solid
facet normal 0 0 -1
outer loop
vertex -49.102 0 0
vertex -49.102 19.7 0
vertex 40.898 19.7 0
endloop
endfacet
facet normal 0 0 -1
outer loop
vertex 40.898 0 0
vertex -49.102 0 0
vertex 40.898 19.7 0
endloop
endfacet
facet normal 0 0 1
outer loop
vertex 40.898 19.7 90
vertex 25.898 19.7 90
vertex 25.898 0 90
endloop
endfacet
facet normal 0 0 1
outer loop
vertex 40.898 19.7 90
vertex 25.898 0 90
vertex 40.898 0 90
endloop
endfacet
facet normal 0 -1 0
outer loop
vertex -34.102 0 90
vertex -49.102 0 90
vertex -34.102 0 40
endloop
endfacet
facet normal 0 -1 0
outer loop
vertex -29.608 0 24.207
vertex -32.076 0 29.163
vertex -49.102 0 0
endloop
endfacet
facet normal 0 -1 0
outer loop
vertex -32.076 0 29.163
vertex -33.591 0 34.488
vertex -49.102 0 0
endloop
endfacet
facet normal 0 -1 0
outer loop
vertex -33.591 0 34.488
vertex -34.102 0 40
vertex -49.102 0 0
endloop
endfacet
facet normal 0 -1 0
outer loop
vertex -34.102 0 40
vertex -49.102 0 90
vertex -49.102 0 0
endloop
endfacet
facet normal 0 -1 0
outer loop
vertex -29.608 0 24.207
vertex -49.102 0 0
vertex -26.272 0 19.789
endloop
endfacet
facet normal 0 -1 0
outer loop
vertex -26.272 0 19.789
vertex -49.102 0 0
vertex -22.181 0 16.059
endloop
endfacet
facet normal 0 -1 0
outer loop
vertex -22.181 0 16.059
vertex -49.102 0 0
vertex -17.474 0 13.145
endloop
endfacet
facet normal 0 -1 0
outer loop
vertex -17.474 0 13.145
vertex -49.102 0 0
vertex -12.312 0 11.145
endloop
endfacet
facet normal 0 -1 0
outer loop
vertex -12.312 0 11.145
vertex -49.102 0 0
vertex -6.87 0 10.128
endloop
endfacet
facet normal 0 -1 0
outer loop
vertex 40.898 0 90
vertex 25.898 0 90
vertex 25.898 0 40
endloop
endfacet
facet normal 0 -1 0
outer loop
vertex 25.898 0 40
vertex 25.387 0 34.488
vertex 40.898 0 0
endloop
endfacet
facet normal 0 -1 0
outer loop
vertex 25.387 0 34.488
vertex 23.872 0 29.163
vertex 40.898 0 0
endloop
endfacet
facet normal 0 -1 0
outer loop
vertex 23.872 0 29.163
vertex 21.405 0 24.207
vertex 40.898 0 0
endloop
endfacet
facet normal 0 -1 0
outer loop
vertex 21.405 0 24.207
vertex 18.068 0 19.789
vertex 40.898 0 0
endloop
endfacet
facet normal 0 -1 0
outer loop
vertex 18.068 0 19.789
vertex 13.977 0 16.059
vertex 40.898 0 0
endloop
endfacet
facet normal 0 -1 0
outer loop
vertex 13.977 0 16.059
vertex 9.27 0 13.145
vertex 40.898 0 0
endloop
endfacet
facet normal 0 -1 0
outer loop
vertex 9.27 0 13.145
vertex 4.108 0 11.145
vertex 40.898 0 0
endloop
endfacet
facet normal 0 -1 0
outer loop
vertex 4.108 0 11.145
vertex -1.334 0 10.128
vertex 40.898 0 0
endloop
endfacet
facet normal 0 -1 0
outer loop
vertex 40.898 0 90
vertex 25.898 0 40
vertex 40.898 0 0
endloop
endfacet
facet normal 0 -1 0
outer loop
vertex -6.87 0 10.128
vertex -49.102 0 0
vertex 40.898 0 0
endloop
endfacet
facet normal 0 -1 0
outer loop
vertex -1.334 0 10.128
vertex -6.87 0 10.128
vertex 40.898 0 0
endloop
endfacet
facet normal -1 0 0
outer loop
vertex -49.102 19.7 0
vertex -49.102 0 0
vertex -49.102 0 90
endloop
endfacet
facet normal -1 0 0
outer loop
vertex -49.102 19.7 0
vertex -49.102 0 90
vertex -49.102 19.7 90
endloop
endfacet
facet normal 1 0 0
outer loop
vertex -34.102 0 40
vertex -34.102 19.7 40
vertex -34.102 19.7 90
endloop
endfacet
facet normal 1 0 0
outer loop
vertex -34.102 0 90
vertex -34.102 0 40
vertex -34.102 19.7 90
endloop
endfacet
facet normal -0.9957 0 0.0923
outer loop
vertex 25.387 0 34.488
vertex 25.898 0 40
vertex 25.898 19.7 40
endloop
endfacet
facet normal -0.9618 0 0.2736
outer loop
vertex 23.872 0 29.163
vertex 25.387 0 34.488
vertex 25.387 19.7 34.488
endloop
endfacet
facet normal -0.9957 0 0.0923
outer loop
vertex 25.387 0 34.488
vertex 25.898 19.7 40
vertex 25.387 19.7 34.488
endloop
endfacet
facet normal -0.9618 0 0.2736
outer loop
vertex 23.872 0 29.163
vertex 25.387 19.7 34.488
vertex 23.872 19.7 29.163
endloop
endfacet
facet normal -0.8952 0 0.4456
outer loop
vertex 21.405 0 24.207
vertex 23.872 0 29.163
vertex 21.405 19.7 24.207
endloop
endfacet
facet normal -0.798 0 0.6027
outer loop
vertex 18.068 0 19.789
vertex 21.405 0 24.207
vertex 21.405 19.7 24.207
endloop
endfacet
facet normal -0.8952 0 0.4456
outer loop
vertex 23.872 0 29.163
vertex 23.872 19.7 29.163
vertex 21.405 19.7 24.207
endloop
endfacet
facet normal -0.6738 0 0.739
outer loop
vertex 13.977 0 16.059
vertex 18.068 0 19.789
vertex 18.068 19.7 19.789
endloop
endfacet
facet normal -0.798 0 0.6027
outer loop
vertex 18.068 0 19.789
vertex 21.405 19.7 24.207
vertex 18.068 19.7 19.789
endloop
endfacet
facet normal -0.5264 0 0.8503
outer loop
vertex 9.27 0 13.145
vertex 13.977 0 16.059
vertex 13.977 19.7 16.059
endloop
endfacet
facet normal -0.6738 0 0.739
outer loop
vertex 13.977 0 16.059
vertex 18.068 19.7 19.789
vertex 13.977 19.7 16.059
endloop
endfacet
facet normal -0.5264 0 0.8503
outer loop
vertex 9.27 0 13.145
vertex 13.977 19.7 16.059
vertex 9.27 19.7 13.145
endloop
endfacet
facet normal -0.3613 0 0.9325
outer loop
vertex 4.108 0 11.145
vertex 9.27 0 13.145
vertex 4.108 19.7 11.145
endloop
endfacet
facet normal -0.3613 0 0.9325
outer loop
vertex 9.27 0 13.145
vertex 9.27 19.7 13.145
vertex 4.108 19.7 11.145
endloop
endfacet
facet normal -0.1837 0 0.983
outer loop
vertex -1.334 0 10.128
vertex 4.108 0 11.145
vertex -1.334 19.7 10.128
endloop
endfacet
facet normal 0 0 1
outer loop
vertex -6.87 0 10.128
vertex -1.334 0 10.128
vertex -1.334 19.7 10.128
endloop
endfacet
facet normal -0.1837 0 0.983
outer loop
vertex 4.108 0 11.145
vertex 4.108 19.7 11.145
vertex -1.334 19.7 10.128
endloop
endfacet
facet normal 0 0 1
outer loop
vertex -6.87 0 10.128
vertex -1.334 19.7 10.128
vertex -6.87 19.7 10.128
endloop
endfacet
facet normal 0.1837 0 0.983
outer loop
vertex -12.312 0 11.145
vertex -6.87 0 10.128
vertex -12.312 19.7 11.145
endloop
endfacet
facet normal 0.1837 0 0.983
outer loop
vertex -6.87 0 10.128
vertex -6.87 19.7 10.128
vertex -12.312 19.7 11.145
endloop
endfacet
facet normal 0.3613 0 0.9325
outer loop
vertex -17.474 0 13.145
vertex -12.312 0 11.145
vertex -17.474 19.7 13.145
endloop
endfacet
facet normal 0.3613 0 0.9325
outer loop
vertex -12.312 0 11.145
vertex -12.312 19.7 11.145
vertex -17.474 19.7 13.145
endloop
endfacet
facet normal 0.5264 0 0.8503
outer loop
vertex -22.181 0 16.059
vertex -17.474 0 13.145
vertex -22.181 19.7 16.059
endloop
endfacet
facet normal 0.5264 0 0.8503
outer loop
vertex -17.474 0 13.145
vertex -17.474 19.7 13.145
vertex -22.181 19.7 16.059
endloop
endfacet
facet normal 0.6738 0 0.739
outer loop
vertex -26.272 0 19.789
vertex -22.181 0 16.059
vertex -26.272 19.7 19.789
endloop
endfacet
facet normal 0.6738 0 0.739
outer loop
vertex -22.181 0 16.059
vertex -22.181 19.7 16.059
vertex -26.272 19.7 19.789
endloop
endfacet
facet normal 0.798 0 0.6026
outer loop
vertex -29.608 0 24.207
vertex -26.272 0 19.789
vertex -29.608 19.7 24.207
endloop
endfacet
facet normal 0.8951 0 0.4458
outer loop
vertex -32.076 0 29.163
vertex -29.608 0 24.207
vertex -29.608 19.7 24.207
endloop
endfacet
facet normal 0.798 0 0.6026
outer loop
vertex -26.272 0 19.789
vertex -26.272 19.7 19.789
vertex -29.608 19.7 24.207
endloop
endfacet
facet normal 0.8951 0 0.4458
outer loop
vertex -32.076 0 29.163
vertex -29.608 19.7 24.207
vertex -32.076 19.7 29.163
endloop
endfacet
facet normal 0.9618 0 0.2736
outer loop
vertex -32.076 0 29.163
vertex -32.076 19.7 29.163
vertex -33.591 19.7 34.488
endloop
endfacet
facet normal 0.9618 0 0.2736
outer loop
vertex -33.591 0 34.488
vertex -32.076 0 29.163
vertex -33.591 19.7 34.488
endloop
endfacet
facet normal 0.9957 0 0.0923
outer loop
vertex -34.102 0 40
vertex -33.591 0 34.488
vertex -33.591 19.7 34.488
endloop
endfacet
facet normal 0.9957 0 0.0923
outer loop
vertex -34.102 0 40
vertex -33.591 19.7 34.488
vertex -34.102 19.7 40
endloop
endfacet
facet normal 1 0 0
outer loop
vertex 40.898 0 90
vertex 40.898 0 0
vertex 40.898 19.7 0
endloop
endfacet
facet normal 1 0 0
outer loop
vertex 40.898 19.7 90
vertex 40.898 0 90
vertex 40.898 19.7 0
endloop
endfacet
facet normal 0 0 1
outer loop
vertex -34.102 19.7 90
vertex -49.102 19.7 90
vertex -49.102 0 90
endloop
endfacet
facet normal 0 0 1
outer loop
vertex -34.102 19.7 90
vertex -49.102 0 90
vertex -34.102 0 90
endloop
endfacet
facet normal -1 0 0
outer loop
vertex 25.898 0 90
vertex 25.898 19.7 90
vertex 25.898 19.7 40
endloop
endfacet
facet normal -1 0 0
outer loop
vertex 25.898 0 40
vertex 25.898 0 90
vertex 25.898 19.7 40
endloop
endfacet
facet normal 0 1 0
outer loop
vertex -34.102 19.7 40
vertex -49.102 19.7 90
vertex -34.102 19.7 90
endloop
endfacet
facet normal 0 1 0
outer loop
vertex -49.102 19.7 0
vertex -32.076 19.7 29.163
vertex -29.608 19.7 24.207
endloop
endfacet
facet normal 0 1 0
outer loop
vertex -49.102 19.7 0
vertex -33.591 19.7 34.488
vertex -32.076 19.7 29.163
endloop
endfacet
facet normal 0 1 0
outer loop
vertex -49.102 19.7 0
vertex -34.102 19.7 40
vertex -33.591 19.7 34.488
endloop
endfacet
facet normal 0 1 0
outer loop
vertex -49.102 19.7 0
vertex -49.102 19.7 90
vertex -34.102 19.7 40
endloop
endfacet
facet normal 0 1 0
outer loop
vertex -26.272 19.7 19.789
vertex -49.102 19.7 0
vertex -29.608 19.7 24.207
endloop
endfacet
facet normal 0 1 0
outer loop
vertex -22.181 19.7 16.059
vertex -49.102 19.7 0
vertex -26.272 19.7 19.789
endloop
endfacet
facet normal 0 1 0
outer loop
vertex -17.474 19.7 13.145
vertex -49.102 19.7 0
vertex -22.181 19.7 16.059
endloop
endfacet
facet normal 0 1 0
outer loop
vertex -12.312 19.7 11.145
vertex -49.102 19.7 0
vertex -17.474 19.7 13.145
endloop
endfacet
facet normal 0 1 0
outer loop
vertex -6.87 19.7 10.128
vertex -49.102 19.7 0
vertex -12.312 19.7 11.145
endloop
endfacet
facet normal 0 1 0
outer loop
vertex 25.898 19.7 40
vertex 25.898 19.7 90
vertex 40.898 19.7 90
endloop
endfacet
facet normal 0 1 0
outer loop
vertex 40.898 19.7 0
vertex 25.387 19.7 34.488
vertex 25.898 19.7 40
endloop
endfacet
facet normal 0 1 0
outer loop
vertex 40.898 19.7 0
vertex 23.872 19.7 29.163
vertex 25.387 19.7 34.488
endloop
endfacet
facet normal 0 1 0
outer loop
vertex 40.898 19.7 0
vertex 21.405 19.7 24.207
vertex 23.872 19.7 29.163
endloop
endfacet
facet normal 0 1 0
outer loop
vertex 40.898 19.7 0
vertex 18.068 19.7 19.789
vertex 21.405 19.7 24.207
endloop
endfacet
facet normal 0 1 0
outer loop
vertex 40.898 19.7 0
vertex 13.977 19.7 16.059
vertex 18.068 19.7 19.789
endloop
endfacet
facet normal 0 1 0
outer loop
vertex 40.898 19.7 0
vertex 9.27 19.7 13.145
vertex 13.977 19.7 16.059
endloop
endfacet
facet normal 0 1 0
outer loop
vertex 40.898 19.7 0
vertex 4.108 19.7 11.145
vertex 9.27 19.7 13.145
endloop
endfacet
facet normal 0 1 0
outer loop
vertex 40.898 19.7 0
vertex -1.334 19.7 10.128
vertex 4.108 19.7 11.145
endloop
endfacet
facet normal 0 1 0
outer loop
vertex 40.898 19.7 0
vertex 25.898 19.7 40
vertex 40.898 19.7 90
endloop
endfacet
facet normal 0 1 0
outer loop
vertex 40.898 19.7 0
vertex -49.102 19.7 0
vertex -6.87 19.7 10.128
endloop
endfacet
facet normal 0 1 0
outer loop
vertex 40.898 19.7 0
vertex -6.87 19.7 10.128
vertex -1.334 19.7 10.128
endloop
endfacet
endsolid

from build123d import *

# Parameters (mm, degrees)
ESQUISSE1_W             = 90
ESQUISSE1_H             = 19.7
BOSS_EXTRU_1_DEPTH      = 90
ENL_V_MAT_EXTRU_1_DEPTH = 30


with BuildPart() as part:
    # Esquisse1 → Boss.-Extru.1 (new body)
    with BuildSketch(Plane.XY):
        with Locations((-4.101935153, 9.85)):
            Rectangle(ESQUISSE1_W, ESQUISSE1_H)
    extrude(amount=BOSS_EXTRU_1_DEPTH)

    # Esquisse2 → Enlèv. mat.-Extru.1 (cut)
    with BuildSketch(Plane(origin=(0, 19.7, 0), x_dir=(1, 0, 0), z_dir=(0, 1, 0))):
        with BuildLine():
            Line((-34.101935153, -40), (-34.101935153, -90))
            Line((-34.101935153, -90), (25.898064847, -90))
            Line((25.898064847, -90), (25.898064847, -40))
            ThreePointArc((25.898064847, -40), (-4.101935153, -10), (-34.101935153, -40))
        make_face()
    extrude(amount=-ENL_V_MAT_EXTRU_1_DEPTH, mode=Mode.SUBTRACT)


solid = part.part
